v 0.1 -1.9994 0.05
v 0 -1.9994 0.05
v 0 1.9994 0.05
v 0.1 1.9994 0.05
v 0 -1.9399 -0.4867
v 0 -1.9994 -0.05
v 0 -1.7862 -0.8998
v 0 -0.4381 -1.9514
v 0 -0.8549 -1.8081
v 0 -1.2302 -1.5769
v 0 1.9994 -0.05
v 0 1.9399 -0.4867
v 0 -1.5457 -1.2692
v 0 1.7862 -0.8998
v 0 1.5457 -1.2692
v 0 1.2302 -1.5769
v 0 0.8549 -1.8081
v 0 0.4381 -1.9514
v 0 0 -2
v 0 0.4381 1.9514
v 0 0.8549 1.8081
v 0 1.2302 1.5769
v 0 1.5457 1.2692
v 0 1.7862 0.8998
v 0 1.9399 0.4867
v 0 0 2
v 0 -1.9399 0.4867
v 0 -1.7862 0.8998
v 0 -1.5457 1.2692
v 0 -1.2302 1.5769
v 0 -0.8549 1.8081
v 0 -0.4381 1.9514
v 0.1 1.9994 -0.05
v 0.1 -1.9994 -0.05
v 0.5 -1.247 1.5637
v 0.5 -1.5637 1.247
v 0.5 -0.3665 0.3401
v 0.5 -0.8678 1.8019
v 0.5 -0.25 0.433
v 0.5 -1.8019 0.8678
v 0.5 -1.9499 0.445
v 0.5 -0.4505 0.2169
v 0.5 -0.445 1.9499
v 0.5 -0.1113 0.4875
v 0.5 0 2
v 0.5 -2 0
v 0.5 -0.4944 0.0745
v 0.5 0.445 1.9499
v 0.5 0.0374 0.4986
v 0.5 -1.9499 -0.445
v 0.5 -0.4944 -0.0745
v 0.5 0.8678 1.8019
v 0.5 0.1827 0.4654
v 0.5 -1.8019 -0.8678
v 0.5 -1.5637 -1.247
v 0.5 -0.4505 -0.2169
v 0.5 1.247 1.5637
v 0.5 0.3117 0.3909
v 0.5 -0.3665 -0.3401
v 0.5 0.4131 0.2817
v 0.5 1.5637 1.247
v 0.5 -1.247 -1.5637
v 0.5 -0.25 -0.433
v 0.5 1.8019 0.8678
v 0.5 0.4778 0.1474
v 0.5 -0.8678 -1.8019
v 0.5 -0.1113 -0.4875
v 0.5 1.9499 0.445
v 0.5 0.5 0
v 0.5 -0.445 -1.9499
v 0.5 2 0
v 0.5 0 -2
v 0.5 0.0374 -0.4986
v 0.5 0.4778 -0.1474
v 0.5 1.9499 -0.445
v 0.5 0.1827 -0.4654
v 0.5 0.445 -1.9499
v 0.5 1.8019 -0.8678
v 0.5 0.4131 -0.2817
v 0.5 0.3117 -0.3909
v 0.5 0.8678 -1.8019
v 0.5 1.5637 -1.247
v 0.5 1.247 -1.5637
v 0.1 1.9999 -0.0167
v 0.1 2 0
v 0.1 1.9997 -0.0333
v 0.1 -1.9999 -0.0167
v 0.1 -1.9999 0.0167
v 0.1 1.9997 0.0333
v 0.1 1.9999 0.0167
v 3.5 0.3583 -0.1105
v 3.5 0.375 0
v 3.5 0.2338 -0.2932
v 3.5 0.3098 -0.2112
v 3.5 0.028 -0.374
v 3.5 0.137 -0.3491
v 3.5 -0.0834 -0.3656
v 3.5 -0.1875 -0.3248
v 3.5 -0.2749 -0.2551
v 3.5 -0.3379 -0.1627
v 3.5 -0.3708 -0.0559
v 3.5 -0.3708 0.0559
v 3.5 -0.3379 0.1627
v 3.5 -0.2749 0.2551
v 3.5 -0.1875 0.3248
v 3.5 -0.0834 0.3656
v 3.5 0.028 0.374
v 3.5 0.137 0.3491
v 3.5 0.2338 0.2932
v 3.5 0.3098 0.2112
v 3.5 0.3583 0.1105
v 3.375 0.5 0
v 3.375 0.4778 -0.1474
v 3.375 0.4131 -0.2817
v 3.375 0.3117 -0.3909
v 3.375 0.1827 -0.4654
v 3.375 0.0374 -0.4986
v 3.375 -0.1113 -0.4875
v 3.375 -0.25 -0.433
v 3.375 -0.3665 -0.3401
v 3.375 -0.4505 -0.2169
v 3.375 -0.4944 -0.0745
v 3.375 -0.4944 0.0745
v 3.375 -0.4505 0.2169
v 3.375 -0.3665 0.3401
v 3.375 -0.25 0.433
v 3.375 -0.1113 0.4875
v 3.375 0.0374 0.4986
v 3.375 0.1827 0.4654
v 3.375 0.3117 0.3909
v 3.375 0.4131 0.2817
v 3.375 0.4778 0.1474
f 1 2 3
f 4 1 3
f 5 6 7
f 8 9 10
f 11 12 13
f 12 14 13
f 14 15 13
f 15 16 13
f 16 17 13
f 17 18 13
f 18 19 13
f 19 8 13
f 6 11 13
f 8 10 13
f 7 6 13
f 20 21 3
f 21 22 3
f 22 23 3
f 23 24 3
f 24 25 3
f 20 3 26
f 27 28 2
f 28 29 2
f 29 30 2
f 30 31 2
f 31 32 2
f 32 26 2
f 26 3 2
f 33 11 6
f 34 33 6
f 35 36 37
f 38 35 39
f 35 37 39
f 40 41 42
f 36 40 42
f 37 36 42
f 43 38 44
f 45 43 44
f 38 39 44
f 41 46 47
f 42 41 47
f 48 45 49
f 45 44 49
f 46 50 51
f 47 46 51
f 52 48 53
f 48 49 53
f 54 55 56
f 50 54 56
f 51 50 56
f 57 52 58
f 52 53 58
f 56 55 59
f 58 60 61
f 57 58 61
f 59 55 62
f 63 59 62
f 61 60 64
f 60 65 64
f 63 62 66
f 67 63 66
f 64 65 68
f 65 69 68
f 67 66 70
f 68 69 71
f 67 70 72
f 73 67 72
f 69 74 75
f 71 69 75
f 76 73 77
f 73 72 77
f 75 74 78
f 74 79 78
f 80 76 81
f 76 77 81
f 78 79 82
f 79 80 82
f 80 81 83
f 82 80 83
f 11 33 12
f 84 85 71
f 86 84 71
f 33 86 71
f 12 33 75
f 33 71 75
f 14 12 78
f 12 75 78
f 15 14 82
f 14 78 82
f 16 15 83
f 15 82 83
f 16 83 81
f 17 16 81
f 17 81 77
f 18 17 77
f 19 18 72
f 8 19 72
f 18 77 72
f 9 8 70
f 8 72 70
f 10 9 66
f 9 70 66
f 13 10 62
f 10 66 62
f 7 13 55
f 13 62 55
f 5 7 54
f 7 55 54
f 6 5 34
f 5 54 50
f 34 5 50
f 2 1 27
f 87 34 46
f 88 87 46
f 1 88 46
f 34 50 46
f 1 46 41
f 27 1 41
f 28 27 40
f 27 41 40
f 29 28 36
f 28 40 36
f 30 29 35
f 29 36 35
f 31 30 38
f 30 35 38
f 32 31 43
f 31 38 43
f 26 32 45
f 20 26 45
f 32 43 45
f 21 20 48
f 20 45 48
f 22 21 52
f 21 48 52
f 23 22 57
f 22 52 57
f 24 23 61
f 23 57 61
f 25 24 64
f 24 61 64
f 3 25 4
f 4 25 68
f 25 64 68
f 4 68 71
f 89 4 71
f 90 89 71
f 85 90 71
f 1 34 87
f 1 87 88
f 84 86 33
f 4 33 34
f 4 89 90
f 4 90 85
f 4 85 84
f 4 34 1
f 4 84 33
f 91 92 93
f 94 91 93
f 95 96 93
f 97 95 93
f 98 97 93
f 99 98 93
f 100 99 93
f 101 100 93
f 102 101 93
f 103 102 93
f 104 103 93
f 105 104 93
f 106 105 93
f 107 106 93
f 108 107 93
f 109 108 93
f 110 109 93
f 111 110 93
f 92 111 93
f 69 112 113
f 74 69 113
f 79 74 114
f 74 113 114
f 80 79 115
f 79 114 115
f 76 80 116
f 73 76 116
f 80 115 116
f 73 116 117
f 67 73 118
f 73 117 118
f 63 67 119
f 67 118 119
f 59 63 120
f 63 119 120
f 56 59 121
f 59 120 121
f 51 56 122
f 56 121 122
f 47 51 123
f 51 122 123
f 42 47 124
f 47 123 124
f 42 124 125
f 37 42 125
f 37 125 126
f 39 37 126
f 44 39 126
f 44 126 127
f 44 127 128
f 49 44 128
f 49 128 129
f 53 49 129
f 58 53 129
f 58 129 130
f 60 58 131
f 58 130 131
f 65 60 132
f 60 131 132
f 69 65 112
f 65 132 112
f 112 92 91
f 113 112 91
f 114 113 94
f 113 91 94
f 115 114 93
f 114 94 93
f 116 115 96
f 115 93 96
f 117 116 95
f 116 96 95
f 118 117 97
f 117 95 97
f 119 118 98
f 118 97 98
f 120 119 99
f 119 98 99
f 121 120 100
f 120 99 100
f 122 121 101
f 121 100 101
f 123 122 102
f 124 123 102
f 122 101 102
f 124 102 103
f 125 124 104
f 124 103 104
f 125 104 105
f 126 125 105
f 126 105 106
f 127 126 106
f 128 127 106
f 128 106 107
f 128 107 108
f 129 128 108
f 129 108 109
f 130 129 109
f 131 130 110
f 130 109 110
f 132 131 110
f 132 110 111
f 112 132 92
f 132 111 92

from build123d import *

# Parameters (mm, degrees)
CHAFL_N1_SIZE         = 0.125
CORTAR_EXTRUIR2_DEPTH = 0.1


with BuildPart() as part:
    # Croquis1 → Revolución1 (revolve)
    with BuildSketch(Plane.XY):
        Polygon((0, 0), (0, 2), (0.5, 2), (0.5, 0.5), (3.5, 0.5), (3.5, 0), align=None)
    revolve(axis=Axis((3.5, 0, 0), (-1, 0, 0)))

    # Chaflán1
    chafl_n1_edges = [part.edges().sort_by_distance(p)[0] for p in [
        (3.5, -0.5, 0),
    ]]
    chamfer(chafl_n1_edges, length=CHAFL_N1_SIZE)

    # Croquis6 → Cortar-Extruir2 (cut)
    with BuildSketch(Plane.ZY):
        with BuildLine():
            Line((-0.05, 1.999374902), (-0.05, -1.999374902))
            ThreePointArc((-0.05, -1.999374902), (0, -2), (0.05, -1.999374902))
            Line((0.05, -1.999374902), (0.05, 1.999374902))
            ThreePointArc((0.05, 1.999374902), (0, 2), (-0.05, 1.999374902))
        make_face()
    extrude(amount=-CORTAR_EXTRUIR2_DEPTH, mode=Mode.SUBTRACT)


solid = part.part
